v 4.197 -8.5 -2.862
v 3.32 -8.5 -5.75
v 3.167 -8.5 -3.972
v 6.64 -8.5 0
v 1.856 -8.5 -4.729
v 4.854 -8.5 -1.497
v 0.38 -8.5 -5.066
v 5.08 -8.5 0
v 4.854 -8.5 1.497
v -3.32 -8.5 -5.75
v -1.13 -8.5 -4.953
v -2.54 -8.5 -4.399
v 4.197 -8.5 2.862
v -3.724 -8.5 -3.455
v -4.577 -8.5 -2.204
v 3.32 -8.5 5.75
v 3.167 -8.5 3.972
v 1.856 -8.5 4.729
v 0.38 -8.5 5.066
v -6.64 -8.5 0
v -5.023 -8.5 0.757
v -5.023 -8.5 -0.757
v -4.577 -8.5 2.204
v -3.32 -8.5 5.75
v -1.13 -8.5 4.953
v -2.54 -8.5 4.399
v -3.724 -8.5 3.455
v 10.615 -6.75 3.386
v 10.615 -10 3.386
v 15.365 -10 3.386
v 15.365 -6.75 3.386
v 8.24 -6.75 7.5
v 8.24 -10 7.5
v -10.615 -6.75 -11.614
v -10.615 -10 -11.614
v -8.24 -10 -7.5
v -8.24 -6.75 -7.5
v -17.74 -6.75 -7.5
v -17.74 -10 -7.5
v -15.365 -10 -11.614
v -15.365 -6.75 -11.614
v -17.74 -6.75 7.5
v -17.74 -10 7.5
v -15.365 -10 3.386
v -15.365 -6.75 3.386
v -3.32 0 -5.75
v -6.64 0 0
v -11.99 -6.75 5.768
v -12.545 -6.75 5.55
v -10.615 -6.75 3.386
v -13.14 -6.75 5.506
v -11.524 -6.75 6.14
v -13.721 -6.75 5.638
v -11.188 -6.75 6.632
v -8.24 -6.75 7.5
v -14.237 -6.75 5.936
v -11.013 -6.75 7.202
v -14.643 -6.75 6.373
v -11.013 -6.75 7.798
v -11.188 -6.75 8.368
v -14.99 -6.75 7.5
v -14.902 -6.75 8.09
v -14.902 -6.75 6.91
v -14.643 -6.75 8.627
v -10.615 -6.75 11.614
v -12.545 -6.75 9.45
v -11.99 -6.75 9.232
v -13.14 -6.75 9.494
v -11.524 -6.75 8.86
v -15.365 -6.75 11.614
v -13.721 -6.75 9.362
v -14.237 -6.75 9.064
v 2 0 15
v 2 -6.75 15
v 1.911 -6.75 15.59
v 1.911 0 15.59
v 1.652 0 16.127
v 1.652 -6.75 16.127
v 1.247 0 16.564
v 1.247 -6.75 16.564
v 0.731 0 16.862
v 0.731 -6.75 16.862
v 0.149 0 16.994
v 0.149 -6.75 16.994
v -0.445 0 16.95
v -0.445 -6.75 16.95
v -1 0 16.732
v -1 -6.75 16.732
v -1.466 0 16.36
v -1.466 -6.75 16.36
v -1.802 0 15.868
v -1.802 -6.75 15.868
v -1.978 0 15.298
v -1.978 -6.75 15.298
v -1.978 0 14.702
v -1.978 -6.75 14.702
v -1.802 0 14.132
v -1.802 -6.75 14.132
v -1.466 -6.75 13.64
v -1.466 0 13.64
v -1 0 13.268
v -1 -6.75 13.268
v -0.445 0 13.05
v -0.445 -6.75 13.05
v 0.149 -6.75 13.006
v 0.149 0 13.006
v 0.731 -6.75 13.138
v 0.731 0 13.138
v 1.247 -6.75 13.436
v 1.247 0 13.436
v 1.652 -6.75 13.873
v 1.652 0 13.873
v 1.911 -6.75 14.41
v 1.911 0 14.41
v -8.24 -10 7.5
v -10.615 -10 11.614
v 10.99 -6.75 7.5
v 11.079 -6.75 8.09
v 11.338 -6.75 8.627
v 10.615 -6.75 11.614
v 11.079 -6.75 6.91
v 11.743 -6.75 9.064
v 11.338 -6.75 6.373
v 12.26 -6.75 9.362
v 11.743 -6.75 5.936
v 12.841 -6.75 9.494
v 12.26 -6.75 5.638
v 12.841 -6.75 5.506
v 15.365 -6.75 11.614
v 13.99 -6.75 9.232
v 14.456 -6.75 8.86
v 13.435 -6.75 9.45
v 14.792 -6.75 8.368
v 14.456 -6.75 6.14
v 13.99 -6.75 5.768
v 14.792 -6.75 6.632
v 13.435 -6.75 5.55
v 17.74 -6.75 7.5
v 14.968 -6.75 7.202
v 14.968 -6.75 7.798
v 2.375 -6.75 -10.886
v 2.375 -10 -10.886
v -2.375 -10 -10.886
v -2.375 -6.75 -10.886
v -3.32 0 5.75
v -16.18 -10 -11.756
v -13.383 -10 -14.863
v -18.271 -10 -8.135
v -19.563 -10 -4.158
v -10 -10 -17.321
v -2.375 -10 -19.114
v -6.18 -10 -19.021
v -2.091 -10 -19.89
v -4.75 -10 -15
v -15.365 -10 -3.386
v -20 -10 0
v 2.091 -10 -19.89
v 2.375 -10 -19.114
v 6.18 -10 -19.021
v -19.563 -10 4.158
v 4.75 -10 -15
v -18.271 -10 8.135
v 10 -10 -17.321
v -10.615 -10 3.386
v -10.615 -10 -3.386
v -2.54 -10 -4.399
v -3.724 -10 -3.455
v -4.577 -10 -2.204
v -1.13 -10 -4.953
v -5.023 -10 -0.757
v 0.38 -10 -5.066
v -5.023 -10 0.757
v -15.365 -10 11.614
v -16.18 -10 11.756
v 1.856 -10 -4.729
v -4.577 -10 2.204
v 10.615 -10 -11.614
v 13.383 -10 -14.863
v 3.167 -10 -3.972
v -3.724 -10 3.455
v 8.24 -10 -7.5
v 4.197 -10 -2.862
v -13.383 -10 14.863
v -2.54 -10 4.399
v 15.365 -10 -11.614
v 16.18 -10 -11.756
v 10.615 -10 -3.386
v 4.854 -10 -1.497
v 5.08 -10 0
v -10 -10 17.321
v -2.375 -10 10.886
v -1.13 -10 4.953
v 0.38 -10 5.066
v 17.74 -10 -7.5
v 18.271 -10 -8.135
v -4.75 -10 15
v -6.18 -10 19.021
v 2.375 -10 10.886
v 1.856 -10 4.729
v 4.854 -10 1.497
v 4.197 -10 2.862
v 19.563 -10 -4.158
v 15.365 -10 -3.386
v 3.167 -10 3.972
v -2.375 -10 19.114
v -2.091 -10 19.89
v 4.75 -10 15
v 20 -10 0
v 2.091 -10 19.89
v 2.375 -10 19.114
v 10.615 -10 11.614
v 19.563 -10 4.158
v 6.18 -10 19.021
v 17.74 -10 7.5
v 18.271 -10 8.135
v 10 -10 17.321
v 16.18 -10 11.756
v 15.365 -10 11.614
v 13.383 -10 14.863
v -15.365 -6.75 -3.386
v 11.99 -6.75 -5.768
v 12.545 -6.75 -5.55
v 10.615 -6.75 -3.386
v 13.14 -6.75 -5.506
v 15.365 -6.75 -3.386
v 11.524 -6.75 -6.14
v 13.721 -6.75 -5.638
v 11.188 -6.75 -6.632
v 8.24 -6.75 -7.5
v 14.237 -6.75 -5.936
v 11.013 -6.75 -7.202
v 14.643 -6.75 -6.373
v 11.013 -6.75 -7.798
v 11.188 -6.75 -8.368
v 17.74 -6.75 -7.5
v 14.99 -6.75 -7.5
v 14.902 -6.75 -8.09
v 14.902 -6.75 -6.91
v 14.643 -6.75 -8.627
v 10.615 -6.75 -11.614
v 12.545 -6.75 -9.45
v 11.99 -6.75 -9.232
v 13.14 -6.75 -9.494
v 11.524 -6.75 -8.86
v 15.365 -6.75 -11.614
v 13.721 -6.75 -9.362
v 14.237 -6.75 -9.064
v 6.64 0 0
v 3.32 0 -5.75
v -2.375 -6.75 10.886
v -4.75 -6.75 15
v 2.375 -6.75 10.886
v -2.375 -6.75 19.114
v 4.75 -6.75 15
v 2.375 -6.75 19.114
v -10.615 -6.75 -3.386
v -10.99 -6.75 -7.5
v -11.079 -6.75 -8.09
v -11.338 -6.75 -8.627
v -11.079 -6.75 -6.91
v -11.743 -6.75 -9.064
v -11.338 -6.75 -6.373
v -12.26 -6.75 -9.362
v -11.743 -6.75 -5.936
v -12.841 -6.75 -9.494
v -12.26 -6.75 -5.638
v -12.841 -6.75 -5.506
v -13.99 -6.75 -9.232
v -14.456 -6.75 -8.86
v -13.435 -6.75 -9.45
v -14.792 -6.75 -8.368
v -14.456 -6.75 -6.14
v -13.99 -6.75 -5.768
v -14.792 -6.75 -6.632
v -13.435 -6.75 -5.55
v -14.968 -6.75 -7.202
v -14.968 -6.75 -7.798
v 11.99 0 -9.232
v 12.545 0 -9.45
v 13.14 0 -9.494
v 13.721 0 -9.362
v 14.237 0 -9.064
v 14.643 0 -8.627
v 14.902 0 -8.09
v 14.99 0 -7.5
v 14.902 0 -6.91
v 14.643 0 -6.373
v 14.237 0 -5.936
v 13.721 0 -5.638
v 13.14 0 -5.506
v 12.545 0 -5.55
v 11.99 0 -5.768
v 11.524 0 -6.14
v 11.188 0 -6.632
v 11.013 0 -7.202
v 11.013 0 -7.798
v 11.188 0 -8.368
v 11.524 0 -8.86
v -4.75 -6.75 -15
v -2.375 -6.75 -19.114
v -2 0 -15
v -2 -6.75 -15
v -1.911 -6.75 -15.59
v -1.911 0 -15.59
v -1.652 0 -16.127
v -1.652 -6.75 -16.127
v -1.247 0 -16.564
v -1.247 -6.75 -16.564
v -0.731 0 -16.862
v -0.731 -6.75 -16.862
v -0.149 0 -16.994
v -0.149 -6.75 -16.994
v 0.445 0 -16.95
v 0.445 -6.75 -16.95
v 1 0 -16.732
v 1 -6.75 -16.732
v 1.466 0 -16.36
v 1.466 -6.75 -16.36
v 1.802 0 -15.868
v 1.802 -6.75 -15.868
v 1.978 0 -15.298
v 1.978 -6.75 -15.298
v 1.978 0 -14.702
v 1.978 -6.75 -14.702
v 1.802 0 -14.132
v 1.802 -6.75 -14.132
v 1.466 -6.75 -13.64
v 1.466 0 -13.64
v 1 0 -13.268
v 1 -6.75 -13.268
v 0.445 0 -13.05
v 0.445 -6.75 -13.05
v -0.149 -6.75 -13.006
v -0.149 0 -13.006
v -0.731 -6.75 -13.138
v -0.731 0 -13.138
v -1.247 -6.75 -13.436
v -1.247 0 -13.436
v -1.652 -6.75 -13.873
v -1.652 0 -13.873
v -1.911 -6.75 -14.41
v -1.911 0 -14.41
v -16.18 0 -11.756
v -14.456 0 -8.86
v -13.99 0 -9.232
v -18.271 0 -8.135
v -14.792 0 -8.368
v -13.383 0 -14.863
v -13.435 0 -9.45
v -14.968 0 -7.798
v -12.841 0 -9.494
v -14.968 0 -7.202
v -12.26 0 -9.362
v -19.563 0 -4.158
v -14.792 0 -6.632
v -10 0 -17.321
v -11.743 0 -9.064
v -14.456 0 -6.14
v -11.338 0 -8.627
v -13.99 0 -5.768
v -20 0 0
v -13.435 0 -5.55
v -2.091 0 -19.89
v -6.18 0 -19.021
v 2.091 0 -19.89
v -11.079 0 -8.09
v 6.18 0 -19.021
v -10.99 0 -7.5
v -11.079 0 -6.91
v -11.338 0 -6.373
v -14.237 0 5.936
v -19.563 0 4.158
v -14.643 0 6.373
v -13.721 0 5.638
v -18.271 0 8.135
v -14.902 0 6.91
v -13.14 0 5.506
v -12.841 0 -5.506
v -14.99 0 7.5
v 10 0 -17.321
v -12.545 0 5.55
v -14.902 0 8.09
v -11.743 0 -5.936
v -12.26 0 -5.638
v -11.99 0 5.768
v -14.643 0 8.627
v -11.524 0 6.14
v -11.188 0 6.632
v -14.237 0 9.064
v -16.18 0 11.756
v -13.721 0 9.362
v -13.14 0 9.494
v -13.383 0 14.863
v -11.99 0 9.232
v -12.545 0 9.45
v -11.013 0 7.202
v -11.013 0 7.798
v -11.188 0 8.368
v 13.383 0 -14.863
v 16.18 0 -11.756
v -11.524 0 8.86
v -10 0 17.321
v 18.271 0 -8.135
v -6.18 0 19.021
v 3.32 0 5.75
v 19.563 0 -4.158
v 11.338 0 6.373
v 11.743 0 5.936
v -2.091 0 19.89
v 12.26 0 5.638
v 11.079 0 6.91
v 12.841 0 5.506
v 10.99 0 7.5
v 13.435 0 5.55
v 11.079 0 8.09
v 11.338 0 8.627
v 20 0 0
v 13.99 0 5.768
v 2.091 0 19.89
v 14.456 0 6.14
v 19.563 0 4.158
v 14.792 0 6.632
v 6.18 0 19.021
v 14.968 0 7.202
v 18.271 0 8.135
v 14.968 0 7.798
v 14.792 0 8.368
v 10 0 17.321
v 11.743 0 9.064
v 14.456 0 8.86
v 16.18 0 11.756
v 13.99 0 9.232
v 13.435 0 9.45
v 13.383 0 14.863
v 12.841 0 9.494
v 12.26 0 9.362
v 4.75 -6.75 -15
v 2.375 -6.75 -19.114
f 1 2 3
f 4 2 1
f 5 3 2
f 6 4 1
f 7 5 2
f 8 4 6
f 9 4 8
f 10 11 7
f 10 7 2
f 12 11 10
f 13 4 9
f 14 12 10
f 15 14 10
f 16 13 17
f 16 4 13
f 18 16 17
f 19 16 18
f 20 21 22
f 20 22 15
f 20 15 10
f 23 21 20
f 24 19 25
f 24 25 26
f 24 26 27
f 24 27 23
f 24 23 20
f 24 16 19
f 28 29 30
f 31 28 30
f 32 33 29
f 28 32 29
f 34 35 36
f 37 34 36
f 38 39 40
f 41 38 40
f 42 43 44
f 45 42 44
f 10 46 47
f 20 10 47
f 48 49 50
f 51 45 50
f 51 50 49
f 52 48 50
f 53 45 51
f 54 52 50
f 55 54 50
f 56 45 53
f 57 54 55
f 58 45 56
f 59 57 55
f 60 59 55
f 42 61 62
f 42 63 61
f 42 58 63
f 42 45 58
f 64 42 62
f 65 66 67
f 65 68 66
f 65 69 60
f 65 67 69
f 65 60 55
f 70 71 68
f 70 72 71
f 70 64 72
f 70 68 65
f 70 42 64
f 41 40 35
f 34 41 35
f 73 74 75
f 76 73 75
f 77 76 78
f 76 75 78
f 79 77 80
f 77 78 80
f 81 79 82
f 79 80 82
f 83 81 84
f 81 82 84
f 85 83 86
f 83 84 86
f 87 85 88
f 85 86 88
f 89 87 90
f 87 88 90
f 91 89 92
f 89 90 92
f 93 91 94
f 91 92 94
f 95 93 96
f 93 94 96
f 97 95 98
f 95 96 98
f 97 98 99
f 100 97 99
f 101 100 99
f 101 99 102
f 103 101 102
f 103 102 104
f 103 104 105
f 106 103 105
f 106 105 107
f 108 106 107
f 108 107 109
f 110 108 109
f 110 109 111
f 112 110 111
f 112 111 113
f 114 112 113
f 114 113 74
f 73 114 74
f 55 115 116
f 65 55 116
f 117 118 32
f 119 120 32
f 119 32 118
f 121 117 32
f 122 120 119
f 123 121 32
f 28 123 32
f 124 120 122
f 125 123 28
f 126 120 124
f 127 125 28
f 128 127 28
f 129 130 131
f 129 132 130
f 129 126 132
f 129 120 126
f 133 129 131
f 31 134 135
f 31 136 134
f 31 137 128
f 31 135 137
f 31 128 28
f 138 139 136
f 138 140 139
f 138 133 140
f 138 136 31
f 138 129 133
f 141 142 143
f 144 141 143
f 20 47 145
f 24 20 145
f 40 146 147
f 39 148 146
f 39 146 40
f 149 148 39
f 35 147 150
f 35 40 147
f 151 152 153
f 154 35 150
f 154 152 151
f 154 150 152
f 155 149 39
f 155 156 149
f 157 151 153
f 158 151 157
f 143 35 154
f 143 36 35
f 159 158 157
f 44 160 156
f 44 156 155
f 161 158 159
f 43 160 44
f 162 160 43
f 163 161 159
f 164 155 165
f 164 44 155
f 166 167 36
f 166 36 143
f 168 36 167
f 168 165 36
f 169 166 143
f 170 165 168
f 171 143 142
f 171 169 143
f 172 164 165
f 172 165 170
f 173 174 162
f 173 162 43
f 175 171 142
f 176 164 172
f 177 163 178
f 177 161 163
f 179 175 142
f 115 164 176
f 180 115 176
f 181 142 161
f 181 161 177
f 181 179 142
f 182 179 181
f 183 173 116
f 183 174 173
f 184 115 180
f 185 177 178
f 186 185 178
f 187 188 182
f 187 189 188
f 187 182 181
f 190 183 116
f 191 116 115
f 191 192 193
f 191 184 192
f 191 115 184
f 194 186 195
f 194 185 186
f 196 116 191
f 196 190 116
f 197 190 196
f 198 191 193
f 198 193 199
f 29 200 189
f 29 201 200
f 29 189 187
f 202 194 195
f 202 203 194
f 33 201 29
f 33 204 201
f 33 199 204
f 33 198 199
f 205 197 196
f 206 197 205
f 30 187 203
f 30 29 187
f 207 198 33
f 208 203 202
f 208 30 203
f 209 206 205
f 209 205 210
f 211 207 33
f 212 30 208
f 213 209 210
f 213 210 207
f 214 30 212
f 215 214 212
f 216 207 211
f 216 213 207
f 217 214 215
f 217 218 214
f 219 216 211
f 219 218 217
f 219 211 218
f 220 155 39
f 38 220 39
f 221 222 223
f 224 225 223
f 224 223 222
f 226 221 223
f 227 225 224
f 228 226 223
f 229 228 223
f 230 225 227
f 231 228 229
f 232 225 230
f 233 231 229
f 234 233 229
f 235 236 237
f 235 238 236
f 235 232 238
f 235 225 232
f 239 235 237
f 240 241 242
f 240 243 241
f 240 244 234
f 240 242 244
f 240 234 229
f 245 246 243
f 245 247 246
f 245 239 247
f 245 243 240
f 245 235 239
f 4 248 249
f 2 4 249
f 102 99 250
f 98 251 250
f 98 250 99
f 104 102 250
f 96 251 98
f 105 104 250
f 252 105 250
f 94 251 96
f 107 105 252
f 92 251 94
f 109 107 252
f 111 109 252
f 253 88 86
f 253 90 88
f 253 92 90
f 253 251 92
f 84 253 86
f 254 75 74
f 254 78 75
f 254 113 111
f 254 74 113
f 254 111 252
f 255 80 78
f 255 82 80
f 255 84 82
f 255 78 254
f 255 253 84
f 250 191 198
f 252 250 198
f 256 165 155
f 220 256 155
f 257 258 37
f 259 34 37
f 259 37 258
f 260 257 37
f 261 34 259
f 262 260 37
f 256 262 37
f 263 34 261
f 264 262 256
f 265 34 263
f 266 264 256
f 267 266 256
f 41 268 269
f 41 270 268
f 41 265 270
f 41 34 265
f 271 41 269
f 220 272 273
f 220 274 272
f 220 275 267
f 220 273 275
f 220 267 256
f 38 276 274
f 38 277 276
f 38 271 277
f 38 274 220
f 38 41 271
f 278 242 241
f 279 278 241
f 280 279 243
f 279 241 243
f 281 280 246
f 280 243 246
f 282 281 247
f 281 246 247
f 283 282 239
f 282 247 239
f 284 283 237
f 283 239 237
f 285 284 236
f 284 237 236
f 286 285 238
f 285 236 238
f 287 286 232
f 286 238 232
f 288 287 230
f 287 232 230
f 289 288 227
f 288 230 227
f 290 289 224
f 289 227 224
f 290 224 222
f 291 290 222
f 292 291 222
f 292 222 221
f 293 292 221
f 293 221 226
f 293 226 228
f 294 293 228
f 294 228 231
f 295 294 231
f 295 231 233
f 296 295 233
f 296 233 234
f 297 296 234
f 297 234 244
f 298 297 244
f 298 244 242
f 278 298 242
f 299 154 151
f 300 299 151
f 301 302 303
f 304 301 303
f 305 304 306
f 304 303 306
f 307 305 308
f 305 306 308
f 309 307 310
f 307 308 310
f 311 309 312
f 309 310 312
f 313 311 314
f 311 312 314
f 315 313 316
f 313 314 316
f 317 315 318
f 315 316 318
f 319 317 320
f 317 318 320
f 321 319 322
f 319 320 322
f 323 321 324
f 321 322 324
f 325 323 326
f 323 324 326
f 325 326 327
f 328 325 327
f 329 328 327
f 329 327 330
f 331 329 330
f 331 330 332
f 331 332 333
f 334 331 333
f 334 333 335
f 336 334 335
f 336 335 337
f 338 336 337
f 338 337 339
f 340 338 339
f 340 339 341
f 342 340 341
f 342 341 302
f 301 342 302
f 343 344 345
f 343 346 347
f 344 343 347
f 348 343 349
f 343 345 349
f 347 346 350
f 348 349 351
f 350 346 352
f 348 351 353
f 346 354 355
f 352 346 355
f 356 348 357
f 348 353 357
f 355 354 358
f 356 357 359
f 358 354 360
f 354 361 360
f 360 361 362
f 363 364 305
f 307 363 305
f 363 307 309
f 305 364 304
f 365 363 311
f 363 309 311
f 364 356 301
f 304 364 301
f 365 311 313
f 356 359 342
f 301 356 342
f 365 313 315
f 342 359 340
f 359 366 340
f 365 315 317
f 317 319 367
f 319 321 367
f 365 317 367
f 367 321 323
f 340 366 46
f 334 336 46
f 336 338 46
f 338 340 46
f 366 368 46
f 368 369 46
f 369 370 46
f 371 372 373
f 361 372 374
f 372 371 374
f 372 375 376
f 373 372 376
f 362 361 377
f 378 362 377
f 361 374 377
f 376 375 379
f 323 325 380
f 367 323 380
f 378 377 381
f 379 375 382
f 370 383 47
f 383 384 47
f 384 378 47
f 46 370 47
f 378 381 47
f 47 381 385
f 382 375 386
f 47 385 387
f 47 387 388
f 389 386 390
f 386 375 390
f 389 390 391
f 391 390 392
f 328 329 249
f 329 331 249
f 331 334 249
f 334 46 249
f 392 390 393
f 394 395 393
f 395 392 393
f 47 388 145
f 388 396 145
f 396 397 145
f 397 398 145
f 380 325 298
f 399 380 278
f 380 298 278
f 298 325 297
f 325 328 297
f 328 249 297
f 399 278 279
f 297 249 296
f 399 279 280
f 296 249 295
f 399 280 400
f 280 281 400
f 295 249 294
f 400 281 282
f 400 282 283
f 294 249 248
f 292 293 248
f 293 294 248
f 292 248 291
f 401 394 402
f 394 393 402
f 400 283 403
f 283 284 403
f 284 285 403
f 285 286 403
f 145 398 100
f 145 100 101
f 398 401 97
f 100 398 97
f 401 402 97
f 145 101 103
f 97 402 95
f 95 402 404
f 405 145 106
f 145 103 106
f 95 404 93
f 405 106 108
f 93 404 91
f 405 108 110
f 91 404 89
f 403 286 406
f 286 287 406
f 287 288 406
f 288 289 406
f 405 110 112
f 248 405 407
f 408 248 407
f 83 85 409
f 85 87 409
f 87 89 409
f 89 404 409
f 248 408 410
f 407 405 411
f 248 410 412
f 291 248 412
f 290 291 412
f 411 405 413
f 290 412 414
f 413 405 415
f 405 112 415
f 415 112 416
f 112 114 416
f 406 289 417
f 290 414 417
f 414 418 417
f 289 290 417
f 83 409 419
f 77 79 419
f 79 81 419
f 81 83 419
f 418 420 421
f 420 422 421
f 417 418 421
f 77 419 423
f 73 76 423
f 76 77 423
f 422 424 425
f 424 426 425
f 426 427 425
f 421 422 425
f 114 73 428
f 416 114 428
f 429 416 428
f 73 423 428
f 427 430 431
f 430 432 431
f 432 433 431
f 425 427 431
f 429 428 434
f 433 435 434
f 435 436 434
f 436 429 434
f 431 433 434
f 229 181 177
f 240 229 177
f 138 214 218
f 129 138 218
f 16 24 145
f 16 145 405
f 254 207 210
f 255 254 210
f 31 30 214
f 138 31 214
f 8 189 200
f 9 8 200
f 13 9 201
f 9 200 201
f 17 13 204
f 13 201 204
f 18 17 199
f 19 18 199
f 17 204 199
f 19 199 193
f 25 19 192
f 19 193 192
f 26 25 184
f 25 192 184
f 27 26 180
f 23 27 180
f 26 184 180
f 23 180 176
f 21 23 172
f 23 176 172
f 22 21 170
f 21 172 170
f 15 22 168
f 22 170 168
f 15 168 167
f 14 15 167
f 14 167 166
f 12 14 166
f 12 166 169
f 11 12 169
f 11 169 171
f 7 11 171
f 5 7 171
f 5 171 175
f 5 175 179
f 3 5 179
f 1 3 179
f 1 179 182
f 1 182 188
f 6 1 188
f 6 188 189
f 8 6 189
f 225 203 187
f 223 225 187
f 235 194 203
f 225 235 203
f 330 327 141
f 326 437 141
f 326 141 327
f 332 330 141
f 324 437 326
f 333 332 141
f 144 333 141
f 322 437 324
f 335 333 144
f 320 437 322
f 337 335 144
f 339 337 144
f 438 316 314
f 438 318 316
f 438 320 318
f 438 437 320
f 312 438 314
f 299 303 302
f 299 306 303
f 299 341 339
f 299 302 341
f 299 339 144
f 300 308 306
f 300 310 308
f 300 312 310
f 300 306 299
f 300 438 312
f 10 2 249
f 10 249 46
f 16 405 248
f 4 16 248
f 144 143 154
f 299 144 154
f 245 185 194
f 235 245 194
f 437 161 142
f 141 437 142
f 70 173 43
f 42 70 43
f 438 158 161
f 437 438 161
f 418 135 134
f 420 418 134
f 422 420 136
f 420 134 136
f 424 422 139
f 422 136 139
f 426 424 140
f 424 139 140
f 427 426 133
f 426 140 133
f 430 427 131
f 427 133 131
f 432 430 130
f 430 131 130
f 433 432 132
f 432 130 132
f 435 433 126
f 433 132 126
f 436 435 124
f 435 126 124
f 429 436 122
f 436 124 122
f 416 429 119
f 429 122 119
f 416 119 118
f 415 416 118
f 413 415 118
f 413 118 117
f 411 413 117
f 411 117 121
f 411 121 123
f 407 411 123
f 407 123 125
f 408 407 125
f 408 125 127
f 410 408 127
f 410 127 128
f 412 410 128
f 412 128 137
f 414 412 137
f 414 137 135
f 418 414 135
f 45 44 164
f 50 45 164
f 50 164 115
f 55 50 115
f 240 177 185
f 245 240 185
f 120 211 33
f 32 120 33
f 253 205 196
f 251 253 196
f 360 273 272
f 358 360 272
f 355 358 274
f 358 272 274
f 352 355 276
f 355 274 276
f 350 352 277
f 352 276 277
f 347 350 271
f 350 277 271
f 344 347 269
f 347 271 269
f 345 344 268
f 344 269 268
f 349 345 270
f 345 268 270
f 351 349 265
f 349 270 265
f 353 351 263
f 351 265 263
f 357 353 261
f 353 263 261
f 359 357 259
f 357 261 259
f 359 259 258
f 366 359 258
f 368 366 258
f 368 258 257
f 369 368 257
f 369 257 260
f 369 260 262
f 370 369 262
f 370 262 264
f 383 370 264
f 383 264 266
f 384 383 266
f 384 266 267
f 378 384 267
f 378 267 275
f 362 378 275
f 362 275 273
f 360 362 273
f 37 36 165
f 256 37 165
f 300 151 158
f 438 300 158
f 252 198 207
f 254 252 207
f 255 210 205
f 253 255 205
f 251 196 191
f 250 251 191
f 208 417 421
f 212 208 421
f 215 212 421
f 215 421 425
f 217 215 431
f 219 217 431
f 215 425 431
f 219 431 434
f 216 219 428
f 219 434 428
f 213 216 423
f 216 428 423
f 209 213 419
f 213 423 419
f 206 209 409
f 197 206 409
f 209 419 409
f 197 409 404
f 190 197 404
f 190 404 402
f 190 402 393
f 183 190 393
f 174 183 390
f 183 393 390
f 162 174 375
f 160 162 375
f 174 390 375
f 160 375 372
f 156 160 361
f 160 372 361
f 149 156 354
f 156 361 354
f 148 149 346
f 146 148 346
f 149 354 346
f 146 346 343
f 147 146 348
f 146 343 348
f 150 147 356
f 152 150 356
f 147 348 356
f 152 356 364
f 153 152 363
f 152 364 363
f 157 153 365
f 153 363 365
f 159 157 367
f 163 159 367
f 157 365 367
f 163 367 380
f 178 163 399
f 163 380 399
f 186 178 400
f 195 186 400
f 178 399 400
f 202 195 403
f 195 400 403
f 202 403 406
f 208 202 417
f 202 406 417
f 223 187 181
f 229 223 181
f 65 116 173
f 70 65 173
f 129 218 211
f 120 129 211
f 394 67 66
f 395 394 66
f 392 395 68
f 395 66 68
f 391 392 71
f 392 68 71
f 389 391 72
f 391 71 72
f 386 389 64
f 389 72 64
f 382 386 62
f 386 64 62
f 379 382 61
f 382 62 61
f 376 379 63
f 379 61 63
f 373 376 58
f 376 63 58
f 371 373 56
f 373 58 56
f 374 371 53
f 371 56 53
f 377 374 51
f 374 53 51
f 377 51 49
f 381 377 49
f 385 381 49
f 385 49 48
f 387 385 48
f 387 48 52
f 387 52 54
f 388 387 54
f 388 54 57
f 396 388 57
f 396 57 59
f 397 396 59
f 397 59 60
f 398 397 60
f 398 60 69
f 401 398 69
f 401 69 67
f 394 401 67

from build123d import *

# Parameters (mm, degrees)
F0_R            = 20
F1_DEPTH        = 10
F3_DEPTH        = 8.5
F4_R            = 2
F5_DEPTH        = 10.001
F5_COPIES_COUNT = 6
F7_DEPTH        = 3.25
F7_COPIES_COUNT = 6
F8_R            = 5.08
F9_DEPTH        = 10.001


# Not quite as in the source:
# - a pattern or mirror of a feature is missing from the dataset's text; its kind, count and spacing are read off the source's solid


with BuildPart() as f1:
    # F0 (on Front) → F1 (new body)
    with BuildSketch(Plane.XZ):
        Circle(F0_R)
    extrude(amount=F1_DEPTH)

    # F2 (on face) → F3 (cut)
    with BuildSketch(Plane(origin=(0, 0, 0), x_dir=(-1, 0, 0), z_dir=(0, 1, 0))):
        Polygon((3.3197640478, 5.75), (-3.3197640478, 5.75), (-6.6395280957, 0), (-3.3197640478, -5.75), (3.3197640478, -5.75), (6.6395280957, 0), align=None)
    extrude(amount=-F3_DEPTH, mode=Mode.SUBTRACT)

    # F4 (on face) → F5 (cut, through all)
    with BuildSketch(Plane.XZ.offset(10)):
        with Locations((0, 15)):
            Circle(F4_R)
    f5 = extrude(amount=-F5_DEPTH, mode=Mode.SUBTRACT)

    # F5_copies: F5 ×6 about axis
    f5_copies_axis = Axis((0, 0, 0), (0, 1, 0))
    for i in range(1, F5_COPIES_COUNT):
        add(f5.rotate(f5_copies_axis, i * 360 / F5_COPIES_COUNT), mode=Mode.SUBTRACT)

    # F6 (on face) → F7 (cut)
    with BuildSketch(Plane.XZ.offset(10)):
        Polygon((2.375, 19.113620668), (-2.375, 19.113620668), (-4.75, 15), (-2.375, 10.886379332), (2.375, 10.886379332), (4.75, 15), align=None)
    f7 = extrude(amount=-F7_DEPTH, mode=Mode.SUBTRACT)

    # F7_copies: F7 ×6 about axis
    f7_copies_axis = Axis((0, 0, 0), (0, 1, 0))
    for i in range(1, F7_COPIES_COUNT):
        add(f7.rotate(f7_copies_axis, i * 360 / F7_COPIES_COUNT), mode=Mode.SUBTRACT)

    # F8 (on face) → F9 (cut, through all)
    with BuildSketch(Plane.XZ.offset(10)):
        Circle(F8_R)
    extrude(amount=-F9_DEPTH, mode=Mode.SUBTRACT)


solid = f1.part
